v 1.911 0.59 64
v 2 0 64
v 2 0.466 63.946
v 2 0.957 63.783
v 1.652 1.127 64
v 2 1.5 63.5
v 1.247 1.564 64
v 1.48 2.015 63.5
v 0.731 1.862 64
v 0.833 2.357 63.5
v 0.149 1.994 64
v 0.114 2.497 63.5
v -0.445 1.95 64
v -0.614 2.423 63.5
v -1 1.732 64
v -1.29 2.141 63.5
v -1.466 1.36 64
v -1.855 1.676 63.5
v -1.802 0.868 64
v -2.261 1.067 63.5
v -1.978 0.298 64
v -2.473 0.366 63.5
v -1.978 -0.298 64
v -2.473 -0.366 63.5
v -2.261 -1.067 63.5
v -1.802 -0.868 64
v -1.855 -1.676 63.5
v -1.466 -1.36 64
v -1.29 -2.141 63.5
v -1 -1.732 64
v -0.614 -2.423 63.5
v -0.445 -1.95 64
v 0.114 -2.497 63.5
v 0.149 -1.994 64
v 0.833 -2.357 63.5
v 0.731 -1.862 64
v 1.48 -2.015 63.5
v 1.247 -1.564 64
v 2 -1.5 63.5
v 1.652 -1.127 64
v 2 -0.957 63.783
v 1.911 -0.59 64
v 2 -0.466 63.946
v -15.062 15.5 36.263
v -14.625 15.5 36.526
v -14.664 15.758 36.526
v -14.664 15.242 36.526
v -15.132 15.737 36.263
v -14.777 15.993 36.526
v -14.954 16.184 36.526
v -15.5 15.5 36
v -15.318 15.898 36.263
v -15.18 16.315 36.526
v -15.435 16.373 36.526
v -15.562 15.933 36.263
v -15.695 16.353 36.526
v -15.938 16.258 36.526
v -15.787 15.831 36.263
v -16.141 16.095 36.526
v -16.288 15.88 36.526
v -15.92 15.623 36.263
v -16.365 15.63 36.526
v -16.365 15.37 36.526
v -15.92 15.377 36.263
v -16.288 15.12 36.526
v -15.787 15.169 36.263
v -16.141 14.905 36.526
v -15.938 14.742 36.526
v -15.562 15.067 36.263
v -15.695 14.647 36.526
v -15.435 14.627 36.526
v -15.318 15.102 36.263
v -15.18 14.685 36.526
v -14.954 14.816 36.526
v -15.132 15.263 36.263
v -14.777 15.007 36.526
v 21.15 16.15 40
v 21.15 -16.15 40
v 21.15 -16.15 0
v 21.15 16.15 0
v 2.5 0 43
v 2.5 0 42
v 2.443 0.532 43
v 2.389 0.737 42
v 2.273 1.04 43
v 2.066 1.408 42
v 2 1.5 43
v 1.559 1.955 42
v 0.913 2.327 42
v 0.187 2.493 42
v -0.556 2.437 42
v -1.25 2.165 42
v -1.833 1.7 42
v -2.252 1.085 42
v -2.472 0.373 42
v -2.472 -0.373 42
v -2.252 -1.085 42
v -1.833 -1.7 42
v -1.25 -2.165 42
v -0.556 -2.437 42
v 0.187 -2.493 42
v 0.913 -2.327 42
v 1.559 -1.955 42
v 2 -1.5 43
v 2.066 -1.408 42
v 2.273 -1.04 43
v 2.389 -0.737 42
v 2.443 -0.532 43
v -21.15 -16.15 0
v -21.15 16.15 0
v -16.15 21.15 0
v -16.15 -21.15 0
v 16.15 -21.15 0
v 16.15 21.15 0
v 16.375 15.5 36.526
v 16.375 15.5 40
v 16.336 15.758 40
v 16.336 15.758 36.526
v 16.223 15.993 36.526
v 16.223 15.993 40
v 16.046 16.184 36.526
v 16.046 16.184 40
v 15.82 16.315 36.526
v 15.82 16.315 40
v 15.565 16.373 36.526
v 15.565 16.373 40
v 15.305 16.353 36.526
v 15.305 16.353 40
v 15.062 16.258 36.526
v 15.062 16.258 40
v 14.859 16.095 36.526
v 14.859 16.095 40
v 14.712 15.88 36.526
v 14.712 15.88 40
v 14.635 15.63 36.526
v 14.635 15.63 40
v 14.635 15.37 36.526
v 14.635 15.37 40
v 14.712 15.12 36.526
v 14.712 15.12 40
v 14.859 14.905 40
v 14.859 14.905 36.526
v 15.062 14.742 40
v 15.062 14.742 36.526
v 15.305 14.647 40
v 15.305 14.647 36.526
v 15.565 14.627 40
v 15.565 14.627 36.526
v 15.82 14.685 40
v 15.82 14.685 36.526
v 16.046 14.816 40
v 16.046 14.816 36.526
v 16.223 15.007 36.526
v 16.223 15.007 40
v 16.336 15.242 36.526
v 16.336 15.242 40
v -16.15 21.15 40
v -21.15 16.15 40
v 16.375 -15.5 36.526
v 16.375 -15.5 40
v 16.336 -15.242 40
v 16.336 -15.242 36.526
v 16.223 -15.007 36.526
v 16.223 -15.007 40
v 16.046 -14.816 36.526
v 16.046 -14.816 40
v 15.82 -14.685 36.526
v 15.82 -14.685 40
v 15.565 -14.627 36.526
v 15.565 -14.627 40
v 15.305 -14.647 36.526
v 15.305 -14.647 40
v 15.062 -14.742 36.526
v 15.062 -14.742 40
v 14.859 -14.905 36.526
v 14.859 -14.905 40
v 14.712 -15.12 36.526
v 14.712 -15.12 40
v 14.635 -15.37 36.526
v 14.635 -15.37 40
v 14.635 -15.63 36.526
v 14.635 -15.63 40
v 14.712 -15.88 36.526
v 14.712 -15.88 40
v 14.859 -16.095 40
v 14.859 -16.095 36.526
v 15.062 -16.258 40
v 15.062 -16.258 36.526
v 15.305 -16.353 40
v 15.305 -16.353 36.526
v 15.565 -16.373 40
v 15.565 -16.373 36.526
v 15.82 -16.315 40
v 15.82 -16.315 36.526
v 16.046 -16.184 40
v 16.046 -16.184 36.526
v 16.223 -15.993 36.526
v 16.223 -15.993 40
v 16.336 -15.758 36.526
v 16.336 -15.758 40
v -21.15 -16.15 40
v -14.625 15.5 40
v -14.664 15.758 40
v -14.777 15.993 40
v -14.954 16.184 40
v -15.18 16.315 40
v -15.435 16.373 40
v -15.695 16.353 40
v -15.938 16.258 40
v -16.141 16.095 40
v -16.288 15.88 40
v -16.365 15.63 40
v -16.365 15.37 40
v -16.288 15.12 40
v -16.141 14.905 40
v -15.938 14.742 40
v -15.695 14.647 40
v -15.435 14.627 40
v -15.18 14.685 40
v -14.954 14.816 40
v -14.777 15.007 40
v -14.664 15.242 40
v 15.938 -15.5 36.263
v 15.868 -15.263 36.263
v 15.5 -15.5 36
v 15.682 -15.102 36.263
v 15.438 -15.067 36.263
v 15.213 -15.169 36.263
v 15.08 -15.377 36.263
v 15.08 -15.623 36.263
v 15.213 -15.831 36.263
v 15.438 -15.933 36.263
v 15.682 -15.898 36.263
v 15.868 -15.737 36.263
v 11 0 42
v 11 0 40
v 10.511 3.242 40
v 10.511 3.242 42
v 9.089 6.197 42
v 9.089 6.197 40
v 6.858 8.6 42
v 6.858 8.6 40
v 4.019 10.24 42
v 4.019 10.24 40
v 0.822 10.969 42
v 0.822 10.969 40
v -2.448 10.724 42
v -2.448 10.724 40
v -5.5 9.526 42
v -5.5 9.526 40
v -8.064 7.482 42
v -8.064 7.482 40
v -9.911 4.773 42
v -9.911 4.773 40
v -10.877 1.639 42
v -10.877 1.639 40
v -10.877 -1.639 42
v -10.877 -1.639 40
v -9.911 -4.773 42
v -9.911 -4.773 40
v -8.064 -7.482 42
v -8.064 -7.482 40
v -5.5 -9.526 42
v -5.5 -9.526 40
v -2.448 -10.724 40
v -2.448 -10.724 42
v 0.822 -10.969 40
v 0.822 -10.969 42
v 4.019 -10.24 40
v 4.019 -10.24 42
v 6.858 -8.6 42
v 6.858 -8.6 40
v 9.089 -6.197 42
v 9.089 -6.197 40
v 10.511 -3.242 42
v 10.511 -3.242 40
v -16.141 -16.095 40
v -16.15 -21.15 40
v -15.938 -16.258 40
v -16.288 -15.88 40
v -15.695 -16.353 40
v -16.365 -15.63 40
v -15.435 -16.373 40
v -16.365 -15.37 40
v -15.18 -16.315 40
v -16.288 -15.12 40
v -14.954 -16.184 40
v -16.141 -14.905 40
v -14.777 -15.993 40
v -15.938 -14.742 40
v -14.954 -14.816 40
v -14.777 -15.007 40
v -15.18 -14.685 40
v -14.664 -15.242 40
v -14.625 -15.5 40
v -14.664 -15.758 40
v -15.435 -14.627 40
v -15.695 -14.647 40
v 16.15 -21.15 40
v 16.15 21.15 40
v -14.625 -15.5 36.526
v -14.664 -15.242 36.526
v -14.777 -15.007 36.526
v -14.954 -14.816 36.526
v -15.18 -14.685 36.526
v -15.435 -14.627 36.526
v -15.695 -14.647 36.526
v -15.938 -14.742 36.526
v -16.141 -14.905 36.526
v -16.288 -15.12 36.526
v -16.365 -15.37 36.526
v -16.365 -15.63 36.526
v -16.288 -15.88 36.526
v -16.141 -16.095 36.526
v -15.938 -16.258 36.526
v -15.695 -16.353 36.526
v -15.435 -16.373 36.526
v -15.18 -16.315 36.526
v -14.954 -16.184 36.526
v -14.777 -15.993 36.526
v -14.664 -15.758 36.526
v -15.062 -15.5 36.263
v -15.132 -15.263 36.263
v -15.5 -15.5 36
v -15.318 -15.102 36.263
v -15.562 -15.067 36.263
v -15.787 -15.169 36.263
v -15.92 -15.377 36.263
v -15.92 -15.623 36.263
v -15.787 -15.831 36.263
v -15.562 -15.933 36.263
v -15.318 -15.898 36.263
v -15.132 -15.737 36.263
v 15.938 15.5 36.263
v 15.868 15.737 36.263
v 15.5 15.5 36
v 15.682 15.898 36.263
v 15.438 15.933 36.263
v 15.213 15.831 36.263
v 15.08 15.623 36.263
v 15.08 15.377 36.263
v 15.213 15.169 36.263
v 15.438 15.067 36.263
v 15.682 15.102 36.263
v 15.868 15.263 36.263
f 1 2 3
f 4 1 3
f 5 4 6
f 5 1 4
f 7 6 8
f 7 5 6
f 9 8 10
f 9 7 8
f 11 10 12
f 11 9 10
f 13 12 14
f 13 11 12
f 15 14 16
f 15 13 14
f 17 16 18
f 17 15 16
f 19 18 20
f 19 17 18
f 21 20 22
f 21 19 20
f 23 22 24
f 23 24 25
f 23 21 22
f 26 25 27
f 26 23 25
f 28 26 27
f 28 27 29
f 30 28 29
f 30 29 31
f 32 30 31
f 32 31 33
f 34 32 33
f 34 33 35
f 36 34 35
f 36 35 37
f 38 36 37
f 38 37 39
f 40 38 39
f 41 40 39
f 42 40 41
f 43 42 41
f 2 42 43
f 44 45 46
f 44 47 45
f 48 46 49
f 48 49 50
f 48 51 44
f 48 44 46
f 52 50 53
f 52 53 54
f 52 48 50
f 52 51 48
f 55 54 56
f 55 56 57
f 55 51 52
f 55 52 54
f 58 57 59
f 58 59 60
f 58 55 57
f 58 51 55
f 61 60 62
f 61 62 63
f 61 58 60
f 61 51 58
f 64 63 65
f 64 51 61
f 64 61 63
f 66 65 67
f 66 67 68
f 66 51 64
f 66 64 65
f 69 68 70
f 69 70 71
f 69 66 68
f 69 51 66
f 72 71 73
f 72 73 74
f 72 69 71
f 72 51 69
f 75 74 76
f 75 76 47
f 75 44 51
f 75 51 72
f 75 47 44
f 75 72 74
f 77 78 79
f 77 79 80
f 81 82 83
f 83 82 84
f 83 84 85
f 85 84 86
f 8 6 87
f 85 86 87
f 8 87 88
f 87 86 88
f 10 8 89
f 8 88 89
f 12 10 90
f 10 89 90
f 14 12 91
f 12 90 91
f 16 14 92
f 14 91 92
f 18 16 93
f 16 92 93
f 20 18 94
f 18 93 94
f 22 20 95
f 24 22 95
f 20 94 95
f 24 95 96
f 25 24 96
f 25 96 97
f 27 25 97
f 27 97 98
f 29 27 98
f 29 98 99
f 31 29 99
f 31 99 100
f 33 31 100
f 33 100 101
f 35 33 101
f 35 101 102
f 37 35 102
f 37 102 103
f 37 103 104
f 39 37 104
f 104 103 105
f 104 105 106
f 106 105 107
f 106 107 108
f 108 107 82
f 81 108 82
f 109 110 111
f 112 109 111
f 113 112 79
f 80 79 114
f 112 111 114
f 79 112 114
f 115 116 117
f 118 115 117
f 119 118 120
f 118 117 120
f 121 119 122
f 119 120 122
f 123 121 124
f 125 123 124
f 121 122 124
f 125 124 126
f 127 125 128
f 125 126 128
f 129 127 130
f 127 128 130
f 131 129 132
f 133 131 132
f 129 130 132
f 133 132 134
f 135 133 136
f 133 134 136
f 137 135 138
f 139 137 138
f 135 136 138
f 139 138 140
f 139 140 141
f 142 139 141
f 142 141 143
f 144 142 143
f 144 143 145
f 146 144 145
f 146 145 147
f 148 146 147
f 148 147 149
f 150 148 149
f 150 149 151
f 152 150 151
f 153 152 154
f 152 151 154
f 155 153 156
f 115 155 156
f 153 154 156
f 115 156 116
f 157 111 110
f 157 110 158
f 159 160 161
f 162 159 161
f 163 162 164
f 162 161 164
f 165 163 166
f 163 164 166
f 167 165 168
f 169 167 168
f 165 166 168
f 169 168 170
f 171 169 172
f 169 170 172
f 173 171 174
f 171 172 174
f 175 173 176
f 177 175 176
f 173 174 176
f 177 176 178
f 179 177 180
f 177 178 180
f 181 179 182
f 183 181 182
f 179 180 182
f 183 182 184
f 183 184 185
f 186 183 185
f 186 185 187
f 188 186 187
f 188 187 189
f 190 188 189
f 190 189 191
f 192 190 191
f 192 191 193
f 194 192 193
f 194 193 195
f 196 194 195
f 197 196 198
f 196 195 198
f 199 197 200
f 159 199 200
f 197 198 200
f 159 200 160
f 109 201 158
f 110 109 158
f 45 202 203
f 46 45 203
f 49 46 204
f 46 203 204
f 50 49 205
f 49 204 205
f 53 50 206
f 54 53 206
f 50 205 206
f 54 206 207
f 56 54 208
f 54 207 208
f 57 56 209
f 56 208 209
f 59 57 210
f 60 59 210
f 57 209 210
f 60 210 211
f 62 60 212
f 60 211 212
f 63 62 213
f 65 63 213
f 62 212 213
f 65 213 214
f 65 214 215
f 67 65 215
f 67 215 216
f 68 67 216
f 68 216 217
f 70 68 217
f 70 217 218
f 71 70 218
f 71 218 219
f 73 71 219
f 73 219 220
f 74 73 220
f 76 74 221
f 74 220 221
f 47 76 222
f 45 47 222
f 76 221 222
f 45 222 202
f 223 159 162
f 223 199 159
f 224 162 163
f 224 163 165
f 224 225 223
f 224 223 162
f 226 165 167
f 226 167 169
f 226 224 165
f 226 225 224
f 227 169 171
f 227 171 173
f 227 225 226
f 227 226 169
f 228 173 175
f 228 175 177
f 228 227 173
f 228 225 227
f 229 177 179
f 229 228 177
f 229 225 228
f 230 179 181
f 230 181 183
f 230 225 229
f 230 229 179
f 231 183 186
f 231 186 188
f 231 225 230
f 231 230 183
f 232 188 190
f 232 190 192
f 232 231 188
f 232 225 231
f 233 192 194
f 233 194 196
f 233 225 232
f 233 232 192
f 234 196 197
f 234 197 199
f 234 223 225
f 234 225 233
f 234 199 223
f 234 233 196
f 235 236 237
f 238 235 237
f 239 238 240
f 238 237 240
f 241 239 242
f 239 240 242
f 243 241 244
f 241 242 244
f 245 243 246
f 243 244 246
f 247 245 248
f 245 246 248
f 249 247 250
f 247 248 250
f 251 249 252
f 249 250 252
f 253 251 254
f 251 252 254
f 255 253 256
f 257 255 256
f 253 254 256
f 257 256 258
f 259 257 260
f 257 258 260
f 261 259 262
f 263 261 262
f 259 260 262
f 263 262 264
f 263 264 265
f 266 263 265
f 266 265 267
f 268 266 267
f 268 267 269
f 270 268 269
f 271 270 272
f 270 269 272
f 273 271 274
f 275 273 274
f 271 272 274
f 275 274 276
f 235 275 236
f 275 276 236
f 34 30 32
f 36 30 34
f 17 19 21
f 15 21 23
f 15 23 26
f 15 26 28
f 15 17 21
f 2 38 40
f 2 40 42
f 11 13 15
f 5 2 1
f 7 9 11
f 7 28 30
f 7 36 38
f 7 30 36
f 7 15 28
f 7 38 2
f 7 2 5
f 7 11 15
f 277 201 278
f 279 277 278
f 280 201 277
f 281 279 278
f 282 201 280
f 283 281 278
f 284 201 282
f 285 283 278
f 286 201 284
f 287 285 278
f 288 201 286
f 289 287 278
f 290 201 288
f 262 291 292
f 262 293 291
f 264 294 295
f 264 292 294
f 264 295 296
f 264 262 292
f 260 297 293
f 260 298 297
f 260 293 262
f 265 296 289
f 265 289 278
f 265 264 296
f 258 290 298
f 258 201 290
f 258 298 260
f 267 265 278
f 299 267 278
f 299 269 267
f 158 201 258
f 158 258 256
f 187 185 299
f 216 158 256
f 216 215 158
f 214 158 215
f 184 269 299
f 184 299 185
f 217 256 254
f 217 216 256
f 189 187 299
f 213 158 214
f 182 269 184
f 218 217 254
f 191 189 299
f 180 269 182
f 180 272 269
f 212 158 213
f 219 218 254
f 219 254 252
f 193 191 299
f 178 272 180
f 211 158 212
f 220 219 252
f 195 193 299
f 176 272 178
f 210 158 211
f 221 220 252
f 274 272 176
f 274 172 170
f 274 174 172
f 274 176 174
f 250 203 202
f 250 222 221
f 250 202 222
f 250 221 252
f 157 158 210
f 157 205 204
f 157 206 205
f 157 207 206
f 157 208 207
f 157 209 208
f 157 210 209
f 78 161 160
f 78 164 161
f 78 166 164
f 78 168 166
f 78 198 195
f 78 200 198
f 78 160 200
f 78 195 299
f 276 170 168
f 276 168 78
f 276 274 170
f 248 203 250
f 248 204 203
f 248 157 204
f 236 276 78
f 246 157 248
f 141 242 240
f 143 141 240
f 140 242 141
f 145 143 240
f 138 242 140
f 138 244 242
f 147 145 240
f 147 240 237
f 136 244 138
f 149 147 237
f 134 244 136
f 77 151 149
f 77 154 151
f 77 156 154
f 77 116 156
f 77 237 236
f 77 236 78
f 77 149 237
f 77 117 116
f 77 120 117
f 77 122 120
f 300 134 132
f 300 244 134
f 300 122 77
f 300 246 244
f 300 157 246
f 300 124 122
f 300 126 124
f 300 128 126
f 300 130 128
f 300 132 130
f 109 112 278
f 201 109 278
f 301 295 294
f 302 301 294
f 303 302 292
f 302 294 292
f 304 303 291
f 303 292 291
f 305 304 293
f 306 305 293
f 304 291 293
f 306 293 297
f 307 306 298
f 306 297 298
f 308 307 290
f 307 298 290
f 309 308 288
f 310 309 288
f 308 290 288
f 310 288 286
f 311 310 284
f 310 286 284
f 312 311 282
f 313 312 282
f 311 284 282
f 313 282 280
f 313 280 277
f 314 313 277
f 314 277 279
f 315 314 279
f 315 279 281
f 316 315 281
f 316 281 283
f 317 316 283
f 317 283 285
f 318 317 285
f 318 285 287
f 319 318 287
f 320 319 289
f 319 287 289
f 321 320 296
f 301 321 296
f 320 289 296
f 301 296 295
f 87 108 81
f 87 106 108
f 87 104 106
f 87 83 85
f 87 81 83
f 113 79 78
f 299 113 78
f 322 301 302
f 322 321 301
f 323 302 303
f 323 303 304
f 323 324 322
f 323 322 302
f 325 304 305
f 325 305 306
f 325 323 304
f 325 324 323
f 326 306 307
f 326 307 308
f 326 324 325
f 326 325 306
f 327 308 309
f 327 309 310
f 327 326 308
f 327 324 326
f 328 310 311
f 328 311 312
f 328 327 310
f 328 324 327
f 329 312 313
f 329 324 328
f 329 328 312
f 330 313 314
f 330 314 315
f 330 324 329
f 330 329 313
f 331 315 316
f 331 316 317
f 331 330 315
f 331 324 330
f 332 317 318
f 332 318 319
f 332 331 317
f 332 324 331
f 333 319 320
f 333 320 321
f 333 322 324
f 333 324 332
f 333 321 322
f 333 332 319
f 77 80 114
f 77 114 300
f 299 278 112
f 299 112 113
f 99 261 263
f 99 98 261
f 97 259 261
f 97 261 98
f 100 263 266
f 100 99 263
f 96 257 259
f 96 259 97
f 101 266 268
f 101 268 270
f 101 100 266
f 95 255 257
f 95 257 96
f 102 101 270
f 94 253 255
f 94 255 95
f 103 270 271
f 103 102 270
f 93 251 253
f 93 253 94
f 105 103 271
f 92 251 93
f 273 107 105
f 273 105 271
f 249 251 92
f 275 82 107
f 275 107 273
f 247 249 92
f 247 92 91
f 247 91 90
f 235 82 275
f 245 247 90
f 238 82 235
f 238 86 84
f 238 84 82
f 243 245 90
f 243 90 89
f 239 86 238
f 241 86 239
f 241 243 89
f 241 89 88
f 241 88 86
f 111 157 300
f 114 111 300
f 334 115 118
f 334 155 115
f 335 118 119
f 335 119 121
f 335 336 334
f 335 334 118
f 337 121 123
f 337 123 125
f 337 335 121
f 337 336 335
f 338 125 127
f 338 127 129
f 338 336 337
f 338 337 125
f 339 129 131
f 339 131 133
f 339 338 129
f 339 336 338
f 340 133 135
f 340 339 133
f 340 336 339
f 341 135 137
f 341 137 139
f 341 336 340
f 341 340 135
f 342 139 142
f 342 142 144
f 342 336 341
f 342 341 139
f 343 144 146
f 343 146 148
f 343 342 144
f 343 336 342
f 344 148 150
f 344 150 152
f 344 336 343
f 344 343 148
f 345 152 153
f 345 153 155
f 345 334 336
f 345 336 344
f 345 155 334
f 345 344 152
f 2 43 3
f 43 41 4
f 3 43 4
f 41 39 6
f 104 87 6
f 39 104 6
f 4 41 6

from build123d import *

# Parameters (mm, degrees)
SKETCH_W          = 42.3
SKETCH_H          = 42.3
PAD_DEPTH         = 40
SKETCH001_R       = 11
PAD001_DEPTH      = 2
SKETCH002_R       = 2.5
PAD002_DEPTH      = 24
CHAMFER_SIZE      = 0.5
SKETCH003_W       = 0.5
SKETCH003_H       = 21
POCKET_DEPTH      = 21.151
POCKET_DEPTH_BACK = 21.151
SKETCH004_R       = 0.875
HOLE_DEPTH        = 3.474247
HOLE_TIPS_R       = 0.875
CHAMFER001_SIZE   = 5


with BuildPart() as part:
    # Sketch → Pad (new body)
    with BuildSketch(Plane.XY):
        Rectangle(SKETCH_W, SKETCH_H)
    extrude(amount=PAD_DEPTH)

    # Sketch001 (on Face6 of Pad) → Pad001 (join)
    with BuildSketch(Plane.XY.offset(40)):
        Circle(SKETCH001_R)
    extrude(amount=PAD001_DEPTH)

    # Sketch002 (on Face5 of Pad001) → Pad002 (join)
    with BuildSketch(Plane.XY.offset(40)):
        Circle(SKETCH002_R)
    extrude(amount=PAD002_DEPTH)

    # Chamfer
    chamfer_edges = [part.edges().sort_by_distance(p)[0] for p in [
        (-2.5, 0, 64),
    ]]
    chamfer(chamfer_edges, length=CHAMFER_SIZE)

    # Sketch003 → Pocket (cut, two sides)
    with BuildSketch(Plane.XZ) as pocket_sk:
        with Locations((2.25, 53.5)):
            Rectangle(SKETCH003_W, SKETCH003_H)
    extrude(amount=-POCKET_DEPTH, mode=Mode.SUBTRACT)
    extrude(pocket_sk.sketch, amount=POCKET_DEPTH_BACK, mode=Mode.SUBTRACT)

    # Sketch004 (on Face8 of Pocket) → Hole (cut)
    with BuildSketch(Plane.XY.offset(40)):
        with Locations((15.5, -15.5)):
            Circle(SKETCH004_R)
        with Locations((15.5, 15.5)):
            Circle(SKETCH004_R)
        with Locations((-15.5, 15.5)):
            Circle(SKETCH004_R)
        with Locations((-15.5, -15.5)):
            Circle(SKETCH004_R)
    extrude(amount=-HOLE_DEPTH, mode=Mode.SUBTRACT)

    # Hole tips → Hole tip 1 section 0
    with BuildSketch(Plane.XY.offset(36.525753), mode=Mode.PRIVATE) as hole_tip_1_s0:
        with Locations((15.5, -15.5)):
            Circle(HOLE_TIPS_R)
    loft([hole_tip_1_s0.sketch, Vertex(15.5, -15.5, 36)], mode=Mode.SUBTRACT)

    # Hole tips → Hole tip 2 section 0
    with BuildSketch(Plane.XY.offset(36.525753), mode=Mode.PRIVATE) as hole_tip_2_s0:
        with Locations((15.5, 15.5)):
            Circle(HOLE_TIPS_R)
    loft([hole_tip_2_s0.sketch, Vertex(15.5, 15.5, 36)], mode=Mode.SUBTRACT)

    # Hole tips → Hole tip 3 section 0
    with BuildSketch(Plane.XY.offset(36.525753), mode=Mode.PRIVATE) as hole_tip_3_s0:
        with Locations((-15.5, 15.5)):
            Circle(HOLE_TIPS_R)
    loft([hole_tip_3_s0.sketch, Vertex(-15.5, 15.5, 36)], mode=Mode.SUBTRACT)

    # Hole tips → Hole tip 4 section 0
    with BuildSketch(Plane.XY.offset(36.525753), mode=Mode.PRIVATE) as hole_tip_4_s0:
        with Locations((-15.5, -15.5)):
            Circle(HOLE_TIPS_R)
    loft([hole_tip_4_s0.sketch, Vertex(-15.5, -15.5, 36)], mode=Mode.SUBTRACT)

    # Chamfer001
    chamfer001_edges = [part.edges().sort_by_distance(p)[0] for p in [
        (21.15, -21.15, 20),
        (21.15, 21.15, 20),
        (-21.15, -21.15, 20),
        (-21.15, 21.15, 20),
    ]]
    chamfer(chamfer001_edges, length=CHAMFER001_SIZE)


solid = part.part
